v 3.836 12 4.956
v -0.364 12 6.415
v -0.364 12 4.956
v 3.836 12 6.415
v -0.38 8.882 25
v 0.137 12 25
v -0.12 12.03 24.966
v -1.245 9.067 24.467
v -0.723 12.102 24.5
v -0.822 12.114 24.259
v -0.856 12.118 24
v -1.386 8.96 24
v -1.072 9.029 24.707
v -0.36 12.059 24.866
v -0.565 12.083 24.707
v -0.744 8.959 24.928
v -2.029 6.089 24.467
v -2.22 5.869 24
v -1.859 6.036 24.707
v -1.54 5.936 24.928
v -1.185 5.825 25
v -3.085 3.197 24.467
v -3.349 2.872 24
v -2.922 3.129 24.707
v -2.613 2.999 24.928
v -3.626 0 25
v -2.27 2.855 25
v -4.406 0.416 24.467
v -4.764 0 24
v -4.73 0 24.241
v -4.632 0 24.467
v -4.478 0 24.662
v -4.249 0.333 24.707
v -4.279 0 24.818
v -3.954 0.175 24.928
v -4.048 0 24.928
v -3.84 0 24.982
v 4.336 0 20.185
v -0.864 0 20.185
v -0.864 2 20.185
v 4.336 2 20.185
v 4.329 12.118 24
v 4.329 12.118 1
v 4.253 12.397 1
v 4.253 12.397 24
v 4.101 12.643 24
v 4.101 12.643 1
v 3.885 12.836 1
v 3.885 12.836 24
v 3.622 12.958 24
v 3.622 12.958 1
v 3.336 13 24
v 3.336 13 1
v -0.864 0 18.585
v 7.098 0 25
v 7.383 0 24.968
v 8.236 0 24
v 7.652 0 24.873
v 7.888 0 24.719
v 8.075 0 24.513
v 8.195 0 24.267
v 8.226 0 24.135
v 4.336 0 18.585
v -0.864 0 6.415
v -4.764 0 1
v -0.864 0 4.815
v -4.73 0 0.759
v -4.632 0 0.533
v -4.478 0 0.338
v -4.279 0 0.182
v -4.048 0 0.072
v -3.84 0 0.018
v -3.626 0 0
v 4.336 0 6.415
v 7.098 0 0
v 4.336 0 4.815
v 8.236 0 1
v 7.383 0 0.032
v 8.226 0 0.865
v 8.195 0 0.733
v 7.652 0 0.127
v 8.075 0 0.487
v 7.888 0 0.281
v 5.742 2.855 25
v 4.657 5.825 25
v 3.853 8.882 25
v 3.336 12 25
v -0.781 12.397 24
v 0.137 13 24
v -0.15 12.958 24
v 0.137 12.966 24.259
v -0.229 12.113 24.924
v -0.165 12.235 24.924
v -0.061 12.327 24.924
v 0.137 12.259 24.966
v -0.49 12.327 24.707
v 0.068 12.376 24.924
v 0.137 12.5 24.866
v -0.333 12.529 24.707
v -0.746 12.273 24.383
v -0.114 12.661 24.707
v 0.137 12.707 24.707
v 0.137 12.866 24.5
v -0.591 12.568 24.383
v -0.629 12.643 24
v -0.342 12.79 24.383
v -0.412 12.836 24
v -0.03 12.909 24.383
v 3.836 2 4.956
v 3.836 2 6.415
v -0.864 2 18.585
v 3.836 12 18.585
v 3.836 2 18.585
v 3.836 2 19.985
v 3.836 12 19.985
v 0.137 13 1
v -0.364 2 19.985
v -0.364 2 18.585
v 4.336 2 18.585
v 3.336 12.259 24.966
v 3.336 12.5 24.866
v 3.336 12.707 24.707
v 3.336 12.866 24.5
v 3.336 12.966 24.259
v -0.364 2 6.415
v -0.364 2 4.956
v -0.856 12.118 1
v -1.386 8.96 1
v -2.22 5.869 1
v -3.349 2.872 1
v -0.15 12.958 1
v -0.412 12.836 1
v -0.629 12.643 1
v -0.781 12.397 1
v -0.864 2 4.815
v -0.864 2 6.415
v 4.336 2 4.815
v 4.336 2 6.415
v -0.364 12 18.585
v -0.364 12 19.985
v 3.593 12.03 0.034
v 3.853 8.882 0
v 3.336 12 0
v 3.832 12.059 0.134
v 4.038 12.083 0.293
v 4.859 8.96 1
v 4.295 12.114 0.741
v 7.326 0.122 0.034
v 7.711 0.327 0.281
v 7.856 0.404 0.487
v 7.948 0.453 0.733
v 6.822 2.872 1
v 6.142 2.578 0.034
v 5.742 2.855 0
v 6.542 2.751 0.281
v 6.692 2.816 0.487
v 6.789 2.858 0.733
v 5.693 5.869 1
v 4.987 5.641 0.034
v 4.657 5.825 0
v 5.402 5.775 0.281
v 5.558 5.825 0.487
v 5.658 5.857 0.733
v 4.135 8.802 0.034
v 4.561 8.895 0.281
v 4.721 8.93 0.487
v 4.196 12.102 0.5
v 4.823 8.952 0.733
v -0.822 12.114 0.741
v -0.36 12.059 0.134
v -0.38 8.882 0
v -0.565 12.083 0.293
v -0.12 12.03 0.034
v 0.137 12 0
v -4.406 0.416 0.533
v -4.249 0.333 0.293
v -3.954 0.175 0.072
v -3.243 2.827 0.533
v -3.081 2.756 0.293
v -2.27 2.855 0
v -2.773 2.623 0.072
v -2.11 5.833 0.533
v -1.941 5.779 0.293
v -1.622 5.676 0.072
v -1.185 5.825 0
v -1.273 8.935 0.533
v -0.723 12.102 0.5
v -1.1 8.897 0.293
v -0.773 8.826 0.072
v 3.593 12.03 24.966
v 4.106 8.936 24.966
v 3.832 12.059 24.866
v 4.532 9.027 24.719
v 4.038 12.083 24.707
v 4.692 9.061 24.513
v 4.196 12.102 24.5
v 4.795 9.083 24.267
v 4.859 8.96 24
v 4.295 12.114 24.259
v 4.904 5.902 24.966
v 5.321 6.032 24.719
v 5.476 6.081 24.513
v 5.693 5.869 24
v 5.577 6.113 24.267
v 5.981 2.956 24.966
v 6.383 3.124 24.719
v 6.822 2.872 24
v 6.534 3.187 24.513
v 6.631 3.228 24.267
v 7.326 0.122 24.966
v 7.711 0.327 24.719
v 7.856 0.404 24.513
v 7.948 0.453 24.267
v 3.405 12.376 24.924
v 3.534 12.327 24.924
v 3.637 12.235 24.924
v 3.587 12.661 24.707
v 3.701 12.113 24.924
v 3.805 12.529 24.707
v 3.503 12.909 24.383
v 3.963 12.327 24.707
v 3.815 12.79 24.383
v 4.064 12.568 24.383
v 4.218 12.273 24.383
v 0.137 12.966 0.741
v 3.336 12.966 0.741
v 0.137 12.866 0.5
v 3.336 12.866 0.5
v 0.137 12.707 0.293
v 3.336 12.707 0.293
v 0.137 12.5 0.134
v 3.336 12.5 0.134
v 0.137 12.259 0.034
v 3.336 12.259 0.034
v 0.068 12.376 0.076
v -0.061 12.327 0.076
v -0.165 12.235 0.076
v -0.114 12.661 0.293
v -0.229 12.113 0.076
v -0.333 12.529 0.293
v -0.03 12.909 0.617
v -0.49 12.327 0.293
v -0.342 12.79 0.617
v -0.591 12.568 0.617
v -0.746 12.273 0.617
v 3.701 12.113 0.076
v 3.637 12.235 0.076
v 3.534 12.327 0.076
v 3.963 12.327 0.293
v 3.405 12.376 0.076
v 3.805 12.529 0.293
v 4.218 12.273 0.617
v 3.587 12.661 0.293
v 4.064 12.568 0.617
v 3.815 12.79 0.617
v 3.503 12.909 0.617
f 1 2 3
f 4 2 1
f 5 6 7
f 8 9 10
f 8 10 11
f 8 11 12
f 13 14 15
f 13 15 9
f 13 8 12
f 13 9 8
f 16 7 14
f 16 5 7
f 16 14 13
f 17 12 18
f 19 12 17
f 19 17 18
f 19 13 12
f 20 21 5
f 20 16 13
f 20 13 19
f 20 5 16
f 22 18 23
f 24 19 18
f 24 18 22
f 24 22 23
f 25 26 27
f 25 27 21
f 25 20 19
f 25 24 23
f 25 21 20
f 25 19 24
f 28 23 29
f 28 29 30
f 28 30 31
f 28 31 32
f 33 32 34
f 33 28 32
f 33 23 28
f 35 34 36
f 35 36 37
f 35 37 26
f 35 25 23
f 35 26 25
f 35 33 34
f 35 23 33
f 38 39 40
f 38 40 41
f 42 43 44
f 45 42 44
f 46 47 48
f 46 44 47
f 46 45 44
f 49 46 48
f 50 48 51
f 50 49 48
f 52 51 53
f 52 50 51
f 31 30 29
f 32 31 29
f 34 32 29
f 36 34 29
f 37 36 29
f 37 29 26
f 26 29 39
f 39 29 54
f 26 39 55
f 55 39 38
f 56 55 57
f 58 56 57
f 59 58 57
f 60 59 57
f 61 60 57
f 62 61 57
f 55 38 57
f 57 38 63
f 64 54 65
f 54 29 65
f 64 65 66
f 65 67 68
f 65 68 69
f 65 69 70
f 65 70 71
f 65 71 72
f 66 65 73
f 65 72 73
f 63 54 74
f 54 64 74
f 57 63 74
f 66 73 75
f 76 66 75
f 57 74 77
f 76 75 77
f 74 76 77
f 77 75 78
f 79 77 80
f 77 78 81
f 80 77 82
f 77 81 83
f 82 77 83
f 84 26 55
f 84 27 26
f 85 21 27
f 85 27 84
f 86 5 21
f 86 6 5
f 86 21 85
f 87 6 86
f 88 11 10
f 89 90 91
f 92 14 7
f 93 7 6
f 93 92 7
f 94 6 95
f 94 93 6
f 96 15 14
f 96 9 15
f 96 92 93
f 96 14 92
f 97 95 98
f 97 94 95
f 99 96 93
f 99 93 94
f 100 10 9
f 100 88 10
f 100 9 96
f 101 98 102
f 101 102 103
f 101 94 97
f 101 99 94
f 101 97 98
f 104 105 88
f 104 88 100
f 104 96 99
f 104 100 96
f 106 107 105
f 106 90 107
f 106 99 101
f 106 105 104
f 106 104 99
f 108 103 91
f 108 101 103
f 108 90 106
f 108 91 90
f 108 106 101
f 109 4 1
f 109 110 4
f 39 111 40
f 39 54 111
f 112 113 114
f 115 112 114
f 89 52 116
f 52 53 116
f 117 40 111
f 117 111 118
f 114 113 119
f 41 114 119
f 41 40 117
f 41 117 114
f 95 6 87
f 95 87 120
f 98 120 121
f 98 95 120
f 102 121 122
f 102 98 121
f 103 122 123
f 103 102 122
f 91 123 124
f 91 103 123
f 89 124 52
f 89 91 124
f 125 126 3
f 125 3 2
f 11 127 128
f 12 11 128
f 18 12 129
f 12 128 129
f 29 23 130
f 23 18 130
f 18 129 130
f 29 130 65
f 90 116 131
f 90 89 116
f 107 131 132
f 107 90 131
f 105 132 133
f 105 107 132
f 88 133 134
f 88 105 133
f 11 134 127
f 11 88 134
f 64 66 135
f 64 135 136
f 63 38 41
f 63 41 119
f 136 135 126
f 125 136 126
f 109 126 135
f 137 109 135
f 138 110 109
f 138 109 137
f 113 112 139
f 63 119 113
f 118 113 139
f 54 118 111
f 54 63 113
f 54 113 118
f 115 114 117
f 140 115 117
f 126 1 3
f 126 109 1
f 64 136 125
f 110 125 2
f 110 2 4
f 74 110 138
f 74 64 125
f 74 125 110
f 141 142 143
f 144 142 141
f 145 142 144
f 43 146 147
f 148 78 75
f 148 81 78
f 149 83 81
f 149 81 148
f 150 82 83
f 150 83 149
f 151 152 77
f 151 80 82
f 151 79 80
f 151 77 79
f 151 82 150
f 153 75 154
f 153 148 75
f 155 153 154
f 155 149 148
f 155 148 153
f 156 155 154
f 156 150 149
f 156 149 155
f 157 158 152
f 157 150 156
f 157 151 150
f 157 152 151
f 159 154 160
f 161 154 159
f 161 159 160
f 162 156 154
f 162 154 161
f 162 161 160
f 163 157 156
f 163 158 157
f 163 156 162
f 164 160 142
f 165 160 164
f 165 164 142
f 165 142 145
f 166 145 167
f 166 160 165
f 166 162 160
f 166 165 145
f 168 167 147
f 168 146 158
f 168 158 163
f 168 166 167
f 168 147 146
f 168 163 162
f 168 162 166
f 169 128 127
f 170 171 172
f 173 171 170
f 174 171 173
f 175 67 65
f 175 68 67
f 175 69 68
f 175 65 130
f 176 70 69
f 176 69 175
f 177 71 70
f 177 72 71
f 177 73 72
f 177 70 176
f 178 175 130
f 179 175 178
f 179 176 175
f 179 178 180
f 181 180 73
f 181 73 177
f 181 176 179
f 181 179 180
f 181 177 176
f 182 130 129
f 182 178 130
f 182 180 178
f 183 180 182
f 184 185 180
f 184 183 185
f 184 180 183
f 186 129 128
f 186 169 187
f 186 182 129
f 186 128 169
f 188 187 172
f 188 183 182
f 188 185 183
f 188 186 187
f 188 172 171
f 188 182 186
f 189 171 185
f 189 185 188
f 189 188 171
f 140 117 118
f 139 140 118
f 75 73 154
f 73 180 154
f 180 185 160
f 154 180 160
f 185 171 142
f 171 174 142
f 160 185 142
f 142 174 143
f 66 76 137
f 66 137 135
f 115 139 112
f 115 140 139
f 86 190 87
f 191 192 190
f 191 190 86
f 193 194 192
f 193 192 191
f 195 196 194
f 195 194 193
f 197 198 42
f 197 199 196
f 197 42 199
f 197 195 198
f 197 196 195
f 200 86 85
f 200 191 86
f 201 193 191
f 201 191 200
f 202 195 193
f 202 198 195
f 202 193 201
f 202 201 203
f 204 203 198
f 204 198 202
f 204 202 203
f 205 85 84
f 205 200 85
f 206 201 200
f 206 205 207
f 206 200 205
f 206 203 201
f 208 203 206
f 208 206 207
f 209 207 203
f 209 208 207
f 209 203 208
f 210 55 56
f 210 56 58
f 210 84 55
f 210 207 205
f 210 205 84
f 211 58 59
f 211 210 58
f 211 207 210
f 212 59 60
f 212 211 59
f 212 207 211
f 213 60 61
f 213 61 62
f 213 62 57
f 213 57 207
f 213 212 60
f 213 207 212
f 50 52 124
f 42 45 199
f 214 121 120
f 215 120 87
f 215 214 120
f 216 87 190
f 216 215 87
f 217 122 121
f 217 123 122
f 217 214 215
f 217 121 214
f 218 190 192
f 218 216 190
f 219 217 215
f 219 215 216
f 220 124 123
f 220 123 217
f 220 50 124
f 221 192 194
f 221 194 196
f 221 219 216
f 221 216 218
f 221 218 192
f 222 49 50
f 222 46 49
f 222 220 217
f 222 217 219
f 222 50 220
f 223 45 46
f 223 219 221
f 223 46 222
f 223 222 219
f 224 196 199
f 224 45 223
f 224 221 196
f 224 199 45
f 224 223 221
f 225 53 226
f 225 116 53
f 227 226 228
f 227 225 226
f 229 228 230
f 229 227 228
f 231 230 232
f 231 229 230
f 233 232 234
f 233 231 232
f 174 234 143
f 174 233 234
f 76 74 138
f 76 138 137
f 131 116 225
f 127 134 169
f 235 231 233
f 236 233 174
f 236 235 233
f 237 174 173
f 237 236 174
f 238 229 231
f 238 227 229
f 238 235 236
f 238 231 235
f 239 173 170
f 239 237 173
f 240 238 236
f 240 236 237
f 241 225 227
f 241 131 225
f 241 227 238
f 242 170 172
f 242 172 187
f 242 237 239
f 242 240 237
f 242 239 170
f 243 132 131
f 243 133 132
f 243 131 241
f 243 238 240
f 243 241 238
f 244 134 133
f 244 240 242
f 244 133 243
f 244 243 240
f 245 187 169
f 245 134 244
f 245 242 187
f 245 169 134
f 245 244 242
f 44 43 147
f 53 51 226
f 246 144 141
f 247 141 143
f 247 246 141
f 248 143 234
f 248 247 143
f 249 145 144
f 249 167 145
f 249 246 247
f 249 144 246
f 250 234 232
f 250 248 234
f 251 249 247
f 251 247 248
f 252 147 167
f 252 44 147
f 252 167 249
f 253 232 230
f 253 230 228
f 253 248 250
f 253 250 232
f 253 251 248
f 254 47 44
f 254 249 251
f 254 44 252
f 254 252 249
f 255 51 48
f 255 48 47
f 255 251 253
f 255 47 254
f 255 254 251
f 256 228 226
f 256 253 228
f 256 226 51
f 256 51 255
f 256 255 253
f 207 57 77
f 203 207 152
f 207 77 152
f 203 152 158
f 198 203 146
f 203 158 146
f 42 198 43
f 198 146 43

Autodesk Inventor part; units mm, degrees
ref_plane "YZ Plane" through (0, 0, 0) normal (1, 0, 0) x (0, 1, 0)
ref_plane "XZ Plane" through (0, 0, 0) normal (0, 1, 0) x (-1, 0, 0)
ref_plane "XY Plane" through (0, 0, 0) normal (0, 0, 1) x (1, 0, 0)
sketch "Sketch1" plane through (0, 0, 0) normal (0, 0, 1) x (1, 0, 0)
  line L0 (-4.7637, 0) -> (8.2363, 0)
  line L1 (8.2363, 0) -> (8.2363, 13)
  line L2 (8.2363, 13) -> (-4.7637, 13)
  line L3 (-4.7637, 13) -> (-4.7637, 0)
  arc A0 (-4.7637, 0) -> (-0.7637, 13) centre (-33.6274, 15.9965) ccw
  arc A1 (4.2363, 13) -> (8.2363, 0) centre (37.1, 15.9965) ccw
  point P0 (0, 0)
  dimension "d0" = 13
  dimension "d1" = 13
  dimension "d2" = 4
  dimension "d3" = 4
  dimension "d4" = 33
  dimension "d5" = 33
extrude "Extrusion1" add sketch "Sketch1" along normal blind 25 contours A0 L2 A1 L0
sketch "Sketch2" plane through (-4.7637, 0, 0) normal (0, -1, 0) x (1, 0, 0)
  line L0 (3.9, 20.185) -> (9.1, 20.185)
  line L1 (9.1, 20.185) -> (9.1, 18.585)
  line L2 (9.1, 18.585) -> (3.9, 18.585)
  line L3 (3.9, 18.585) -> (3.9, 20.185)
  line L4 (3.9, 6.415) -> (9.1, 6.415)
  line L5 (9.1, 6.415) -> (9.1, 4.815)
  line L6 (9.1, 4.815) -> (3.9, 4.815)
  line L7 (3.9, 4.815) -> (3.9, 6.415)
  line L8 (0, 0) -> (0, 25) projected
  line L9 (0, 25) -> (13, 25) projected
  point P0 (4.7637, 0)
  dimension "d8" = 5.2
  dimension "d9" = 3.9
  dimension "d10" = 1.6
  dimension "d11" = 1.6
  dimension "d12" = 15.37
  dimension "d13" = 4.815
  dimension "d23" = 13
extrude "Extrusion2" cut sketch "Sketch2" against normal blind 2
fillet "Fillet1" radius 1 8 edges at (4.2363, 13, 12.5) (1.7363, 13, 25) (-0.7637, 13, 12.5) (1.7363, 13, 0) (5.5593, 6.2917, 25) (-2.0867, 6.2917, 25) (5.5593, 6.2917, 0) (-2.0867, 6.2917, 0)
sketch "Sketch4" plane through (-4.7637, 2, 0) normal (0, -1, 0) x (1, 0, 0)
  point P0 (4.7637, 0)
sketch "Sketch5" plane through (-4.7637, 2, 0) normal (0, -1, 0) x (1, 0, 0)
  line L0 (3.9, 18.585) -> (9.1, 18.585) projected
  line L1 (8.6, 19.985) -> (4.4, 19.985)
  line L2 (4.4, 19.985) -> (4.4, 18.585)
  line L3 (4.4, 18.585) -> (8.6, 18.585)
  line L4 (8.6, 18.585) -> (8.6, 19.985)
  line L5 (3.9, 18.585) -> (3.9, 20.185) projected
  line L6 (9.1, 20.185) -> (9.1, 18.585) projected
  line L7 (9.1, 6.415) -> (3.9, 6.415) projected
  line L8 (4.4, 6.415) -> (8.6, 6.415)
  line L9 (8.6, 6.415) -> (8.6, 4.9558)
  line L10 (8.6, 4.9558) -> (4.4, 4.9558)
  line L11 (4.4, 4.9558) -> (4.4, 6.415)
  point P0 (4.7637, 0)
  dimension "d24" = 1.4
  dimension "d25" = 0.5
  dimension "d26" = 0.5
extrude "Extrusion4" cut sketch "Sketch5" against normal blind 10
properties part number "DoubleSliderCap"
